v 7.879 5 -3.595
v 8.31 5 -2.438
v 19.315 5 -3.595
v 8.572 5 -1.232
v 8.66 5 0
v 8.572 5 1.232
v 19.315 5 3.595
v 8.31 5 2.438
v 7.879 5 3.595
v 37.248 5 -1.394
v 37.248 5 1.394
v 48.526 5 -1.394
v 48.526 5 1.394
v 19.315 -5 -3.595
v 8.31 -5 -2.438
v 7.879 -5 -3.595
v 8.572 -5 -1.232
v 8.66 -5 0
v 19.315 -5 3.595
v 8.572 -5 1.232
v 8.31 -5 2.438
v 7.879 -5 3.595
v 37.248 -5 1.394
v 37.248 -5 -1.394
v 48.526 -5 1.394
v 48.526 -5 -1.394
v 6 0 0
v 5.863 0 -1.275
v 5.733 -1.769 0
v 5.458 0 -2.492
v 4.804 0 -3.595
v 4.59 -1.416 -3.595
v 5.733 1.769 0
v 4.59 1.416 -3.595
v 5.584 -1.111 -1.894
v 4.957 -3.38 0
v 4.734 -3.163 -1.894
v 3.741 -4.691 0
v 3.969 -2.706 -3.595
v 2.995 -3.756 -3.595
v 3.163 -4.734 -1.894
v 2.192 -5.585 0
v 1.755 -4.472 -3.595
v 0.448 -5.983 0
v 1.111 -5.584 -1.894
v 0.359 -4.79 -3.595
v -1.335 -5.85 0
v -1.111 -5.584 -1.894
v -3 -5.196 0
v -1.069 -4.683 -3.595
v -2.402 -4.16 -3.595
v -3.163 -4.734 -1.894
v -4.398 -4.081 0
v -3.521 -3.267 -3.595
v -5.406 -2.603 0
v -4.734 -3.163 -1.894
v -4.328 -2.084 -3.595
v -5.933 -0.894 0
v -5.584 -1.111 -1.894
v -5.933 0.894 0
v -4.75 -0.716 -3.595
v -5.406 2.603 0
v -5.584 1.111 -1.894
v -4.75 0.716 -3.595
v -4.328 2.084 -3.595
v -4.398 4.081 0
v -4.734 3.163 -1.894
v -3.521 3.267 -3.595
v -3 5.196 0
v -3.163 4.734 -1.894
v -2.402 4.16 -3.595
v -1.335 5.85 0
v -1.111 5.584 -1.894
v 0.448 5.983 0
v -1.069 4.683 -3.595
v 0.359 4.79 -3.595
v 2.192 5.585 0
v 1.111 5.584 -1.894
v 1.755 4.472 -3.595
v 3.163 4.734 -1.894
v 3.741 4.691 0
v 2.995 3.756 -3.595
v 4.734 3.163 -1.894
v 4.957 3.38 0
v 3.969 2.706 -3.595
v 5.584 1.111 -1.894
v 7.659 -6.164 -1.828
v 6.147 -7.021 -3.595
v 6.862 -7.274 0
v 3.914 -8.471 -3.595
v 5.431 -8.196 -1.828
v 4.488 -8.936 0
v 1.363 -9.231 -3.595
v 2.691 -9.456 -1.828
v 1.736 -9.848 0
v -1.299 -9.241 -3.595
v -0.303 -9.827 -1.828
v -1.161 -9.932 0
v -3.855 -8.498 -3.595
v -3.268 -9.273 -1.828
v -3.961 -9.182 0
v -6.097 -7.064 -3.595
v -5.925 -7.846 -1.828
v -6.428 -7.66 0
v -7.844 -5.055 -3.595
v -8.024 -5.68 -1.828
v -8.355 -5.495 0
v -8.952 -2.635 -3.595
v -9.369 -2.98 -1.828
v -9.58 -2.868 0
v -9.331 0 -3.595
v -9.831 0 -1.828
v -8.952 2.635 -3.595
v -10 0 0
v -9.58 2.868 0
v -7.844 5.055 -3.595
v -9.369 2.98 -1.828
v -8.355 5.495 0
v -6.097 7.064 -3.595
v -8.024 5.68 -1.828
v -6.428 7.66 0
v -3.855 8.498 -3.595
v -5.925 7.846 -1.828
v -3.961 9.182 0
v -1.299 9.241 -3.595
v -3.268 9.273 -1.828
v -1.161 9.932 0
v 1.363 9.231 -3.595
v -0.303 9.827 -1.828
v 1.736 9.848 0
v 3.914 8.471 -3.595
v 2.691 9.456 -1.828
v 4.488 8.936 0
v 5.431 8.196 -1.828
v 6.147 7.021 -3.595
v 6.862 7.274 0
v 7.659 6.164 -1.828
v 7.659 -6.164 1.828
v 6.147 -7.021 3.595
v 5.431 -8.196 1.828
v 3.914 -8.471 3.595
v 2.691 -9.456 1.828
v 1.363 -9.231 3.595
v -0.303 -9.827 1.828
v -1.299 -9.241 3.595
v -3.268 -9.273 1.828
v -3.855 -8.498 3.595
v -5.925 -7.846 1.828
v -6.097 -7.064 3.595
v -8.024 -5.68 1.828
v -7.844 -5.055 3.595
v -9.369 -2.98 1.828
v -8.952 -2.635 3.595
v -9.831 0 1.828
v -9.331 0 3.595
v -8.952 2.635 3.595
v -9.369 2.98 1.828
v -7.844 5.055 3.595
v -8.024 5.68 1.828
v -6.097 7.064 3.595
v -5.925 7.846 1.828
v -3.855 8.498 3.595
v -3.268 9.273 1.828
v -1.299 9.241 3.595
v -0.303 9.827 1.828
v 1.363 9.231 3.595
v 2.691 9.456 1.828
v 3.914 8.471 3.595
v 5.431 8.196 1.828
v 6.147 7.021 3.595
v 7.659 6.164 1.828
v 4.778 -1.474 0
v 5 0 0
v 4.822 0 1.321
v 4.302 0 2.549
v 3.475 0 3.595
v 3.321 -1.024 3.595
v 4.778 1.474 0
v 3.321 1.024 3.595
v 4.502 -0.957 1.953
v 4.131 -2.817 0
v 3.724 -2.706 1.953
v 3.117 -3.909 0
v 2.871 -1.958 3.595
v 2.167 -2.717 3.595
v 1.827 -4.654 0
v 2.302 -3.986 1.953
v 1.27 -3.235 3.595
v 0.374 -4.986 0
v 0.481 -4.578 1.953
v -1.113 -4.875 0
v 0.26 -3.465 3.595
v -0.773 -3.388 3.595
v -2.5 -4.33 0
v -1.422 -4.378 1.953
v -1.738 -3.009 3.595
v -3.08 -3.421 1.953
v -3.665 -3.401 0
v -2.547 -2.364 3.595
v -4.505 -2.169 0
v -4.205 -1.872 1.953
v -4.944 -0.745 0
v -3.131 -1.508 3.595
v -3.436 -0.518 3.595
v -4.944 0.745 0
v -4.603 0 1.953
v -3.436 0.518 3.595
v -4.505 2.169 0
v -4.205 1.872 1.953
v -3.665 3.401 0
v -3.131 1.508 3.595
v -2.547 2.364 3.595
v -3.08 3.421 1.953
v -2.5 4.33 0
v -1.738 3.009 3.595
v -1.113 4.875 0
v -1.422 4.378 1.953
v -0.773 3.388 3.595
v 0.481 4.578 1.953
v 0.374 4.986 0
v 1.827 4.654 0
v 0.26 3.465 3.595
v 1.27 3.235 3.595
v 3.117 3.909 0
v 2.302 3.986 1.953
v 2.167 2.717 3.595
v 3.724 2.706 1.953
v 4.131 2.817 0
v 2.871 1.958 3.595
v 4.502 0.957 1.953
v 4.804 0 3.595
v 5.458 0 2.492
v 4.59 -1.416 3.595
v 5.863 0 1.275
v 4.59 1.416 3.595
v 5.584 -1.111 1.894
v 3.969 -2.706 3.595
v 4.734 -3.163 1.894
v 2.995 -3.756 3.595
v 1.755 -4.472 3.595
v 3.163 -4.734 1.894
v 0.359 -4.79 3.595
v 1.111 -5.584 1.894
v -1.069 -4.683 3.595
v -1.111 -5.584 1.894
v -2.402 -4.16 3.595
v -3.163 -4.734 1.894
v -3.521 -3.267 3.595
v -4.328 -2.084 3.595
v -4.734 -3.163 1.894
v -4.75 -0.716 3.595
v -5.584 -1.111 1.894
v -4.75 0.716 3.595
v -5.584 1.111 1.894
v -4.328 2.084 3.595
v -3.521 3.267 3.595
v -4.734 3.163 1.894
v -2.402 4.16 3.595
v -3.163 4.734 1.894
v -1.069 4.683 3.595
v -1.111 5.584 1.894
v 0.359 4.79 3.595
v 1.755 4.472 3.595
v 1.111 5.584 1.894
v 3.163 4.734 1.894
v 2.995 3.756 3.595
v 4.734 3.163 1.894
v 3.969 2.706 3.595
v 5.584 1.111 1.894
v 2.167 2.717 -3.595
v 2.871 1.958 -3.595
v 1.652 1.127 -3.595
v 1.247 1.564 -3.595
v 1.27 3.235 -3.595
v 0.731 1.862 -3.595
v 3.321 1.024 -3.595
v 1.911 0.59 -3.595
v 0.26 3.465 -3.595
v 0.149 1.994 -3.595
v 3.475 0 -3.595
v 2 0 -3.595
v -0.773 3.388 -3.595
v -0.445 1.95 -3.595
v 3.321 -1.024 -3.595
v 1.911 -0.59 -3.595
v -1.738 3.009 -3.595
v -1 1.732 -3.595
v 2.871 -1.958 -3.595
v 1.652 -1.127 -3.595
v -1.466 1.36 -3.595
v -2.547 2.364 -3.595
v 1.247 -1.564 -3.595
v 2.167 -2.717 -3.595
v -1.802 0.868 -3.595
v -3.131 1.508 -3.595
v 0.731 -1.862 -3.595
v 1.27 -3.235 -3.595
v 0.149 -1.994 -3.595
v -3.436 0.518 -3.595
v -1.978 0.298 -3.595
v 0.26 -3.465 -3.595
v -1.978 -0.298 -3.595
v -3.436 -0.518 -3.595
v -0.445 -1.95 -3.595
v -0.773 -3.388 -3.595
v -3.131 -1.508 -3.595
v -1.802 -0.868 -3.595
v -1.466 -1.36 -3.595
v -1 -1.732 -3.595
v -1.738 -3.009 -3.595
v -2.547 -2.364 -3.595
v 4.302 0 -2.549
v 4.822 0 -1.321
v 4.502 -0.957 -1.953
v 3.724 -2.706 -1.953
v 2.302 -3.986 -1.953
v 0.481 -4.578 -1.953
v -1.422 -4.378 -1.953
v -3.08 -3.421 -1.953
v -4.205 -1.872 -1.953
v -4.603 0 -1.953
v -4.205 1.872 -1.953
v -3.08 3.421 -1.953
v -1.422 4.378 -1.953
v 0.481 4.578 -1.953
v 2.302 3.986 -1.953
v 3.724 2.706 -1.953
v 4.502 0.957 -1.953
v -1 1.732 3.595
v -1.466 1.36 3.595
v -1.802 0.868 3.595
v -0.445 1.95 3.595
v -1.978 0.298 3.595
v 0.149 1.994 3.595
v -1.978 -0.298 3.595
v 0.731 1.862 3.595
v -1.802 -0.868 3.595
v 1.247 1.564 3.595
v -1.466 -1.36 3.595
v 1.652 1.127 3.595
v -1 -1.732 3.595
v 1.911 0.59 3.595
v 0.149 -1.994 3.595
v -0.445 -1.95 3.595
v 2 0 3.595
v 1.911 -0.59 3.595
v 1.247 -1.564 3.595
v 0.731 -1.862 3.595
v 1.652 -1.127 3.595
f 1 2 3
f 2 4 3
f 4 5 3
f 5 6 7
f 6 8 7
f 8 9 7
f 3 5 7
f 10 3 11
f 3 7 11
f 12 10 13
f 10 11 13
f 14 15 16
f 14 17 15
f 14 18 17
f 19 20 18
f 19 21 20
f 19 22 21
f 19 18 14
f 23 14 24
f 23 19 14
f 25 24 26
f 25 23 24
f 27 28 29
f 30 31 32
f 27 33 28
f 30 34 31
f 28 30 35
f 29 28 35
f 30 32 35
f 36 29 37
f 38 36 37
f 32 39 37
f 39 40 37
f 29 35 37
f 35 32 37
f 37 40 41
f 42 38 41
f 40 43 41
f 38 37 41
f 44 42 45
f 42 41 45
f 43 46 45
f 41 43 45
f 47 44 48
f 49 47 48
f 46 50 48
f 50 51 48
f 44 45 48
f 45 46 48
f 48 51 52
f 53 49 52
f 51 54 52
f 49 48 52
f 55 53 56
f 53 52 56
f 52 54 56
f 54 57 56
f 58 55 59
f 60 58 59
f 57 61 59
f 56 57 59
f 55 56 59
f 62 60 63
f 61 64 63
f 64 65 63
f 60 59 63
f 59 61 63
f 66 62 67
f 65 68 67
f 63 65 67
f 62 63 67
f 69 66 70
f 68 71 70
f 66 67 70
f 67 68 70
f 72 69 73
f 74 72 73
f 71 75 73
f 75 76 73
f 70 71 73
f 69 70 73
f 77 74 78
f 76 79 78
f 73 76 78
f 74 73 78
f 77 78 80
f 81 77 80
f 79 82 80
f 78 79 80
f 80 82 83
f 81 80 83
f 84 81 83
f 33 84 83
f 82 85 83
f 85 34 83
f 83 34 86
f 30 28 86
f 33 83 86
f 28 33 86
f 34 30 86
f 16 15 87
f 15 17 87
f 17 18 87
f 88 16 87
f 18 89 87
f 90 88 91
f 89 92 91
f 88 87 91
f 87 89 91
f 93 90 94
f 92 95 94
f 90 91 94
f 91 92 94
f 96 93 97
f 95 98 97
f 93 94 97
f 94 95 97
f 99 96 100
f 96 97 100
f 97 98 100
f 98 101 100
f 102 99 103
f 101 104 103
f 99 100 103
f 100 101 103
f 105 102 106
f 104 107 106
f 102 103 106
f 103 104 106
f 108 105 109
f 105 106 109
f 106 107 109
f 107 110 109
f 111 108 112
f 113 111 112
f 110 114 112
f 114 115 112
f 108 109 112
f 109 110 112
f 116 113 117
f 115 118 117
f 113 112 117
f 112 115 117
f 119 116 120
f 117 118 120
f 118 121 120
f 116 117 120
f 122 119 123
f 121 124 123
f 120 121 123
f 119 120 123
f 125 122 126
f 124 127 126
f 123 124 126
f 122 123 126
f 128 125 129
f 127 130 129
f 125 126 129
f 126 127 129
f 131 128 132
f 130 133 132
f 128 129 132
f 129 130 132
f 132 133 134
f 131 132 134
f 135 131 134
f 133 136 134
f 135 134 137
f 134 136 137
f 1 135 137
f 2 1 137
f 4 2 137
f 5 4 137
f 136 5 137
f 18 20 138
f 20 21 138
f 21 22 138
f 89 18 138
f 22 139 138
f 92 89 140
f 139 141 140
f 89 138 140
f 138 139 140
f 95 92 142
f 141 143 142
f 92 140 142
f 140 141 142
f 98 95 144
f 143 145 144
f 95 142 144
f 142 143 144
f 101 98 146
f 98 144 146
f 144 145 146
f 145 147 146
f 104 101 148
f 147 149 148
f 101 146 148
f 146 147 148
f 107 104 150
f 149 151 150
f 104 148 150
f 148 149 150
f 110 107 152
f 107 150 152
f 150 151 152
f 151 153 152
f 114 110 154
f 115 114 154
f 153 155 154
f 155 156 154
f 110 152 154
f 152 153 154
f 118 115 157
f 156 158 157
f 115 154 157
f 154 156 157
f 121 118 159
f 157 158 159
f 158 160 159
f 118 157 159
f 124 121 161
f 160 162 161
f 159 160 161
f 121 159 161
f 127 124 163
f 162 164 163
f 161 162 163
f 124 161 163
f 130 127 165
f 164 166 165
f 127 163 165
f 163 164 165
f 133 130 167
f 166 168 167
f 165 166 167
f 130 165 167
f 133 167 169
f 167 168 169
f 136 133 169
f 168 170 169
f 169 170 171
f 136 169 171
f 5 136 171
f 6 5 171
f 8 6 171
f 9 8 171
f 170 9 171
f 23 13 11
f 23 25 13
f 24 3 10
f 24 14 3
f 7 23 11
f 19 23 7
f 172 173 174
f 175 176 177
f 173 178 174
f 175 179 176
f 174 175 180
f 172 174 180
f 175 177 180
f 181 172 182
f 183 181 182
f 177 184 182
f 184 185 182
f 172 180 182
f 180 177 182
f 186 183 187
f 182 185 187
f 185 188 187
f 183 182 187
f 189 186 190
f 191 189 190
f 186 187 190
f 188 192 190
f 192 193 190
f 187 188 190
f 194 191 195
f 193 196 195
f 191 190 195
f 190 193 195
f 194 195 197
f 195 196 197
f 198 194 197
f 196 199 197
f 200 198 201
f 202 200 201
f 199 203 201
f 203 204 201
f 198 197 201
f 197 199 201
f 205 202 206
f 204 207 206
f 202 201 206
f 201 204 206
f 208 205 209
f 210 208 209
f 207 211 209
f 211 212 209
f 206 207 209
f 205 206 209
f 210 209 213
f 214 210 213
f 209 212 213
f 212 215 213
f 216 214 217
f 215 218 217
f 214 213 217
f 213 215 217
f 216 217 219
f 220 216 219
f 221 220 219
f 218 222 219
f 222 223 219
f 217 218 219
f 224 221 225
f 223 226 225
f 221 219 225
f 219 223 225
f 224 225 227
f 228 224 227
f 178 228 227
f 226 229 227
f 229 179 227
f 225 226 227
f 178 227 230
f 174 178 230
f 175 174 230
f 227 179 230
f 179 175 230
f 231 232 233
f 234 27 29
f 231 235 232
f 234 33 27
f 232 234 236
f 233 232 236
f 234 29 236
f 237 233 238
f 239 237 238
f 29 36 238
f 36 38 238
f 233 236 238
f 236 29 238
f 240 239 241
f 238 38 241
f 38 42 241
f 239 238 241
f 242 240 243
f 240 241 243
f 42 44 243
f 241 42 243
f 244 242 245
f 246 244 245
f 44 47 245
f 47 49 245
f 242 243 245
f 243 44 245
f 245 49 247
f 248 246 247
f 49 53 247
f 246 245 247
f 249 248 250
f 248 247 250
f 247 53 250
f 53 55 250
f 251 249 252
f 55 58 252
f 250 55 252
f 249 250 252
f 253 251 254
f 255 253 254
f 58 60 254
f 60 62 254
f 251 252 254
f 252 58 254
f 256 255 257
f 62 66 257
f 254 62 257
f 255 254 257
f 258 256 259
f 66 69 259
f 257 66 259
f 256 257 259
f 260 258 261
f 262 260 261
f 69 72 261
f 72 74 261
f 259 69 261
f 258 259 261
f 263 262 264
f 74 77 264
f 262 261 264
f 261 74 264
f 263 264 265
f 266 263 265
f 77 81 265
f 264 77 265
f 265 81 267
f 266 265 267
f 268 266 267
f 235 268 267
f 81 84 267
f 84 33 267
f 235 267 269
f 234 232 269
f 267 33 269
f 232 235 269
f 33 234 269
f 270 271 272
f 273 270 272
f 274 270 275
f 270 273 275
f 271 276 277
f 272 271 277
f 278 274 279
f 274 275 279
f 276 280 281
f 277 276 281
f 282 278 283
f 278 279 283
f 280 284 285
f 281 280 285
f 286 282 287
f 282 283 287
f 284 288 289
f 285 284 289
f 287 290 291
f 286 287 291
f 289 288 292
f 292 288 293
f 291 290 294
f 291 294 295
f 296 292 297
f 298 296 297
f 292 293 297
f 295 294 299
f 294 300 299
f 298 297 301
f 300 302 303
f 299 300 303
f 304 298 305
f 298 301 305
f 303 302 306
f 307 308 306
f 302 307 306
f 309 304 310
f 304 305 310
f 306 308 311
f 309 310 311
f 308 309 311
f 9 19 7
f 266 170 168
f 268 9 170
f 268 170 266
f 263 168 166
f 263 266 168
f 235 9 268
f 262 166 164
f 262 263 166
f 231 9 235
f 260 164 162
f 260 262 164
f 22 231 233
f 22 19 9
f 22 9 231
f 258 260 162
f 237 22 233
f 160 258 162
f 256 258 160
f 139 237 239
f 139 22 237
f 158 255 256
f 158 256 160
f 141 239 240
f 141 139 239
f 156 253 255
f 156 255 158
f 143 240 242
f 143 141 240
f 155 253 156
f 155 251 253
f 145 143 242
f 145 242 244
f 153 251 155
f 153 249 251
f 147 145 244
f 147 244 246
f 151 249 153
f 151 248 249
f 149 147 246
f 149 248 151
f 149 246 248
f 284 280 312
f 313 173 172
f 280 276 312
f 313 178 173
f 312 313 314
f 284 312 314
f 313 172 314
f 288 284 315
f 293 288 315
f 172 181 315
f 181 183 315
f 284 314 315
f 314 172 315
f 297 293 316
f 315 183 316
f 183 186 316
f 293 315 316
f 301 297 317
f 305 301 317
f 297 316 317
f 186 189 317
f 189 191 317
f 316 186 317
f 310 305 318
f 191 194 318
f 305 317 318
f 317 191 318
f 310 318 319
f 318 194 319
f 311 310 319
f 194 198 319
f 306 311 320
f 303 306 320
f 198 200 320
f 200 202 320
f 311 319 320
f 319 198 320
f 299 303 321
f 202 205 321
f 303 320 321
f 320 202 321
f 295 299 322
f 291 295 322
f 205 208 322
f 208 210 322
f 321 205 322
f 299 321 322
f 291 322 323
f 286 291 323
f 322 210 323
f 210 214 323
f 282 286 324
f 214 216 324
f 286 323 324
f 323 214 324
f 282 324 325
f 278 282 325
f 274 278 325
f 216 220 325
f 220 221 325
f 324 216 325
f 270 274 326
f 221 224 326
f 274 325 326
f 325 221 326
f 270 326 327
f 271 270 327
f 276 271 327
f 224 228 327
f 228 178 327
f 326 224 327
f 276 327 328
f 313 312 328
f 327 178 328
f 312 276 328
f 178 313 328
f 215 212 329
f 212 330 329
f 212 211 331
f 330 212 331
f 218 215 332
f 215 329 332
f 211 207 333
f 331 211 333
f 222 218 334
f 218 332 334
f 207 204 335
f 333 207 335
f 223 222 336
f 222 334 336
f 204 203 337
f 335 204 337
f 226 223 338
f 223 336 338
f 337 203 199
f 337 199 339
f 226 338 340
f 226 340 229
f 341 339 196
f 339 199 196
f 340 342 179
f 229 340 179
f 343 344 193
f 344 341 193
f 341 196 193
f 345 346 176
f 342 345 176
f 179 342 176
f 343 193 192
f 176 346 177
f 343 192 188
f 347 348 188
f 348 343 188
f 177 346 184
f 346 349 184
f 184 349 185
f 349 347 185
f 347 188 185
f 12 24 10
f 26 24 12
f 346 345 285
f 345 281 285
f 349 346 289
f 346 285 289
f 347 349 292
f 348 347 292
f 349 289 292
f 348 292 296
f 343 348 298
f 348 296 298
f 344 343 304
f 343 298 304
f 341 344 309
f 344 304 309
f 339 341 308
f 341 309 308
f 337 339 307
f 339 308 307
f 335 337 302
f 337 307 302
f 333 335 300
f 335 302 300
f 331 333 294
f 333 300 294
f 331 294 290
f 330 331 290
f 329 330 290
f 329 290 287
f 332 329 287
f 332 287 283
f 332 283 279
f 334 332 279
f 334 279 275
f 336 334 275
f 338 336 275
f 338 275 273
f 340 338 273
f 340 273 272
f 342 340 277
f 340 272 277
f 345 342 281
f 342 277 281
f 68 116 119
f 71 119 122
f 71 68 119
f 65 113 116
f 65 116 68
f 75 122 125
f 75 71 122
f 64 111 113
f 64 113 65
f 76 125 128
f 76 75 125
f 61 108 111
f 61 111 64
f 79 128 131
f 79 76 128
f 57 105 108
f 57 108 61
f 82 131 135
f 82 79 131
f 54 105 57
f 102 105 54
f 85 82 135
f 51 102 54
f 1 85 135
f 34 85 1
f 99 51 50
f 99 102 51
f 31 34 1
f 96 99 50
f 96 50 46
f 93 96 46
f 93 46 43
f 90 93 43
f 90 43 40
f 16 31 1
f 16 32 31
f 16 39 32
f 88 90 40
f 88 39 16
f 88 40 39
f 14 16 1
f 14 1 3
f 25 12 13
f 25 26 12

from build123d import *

# Parameters (mm, degrees)
F2_DEPTH      = 5
F2_DEPTH_BACK = 5


with BuildPart() as f1:
    # F0 (on Front) → F1 (revolve)
    with BuildSketch(Plane.XZ):
        with BuildLine():
            ThreePointArc((3.4750503593, -3.595), (4.6030018356, -1.9525301794), (5, 0))
            Line((5, 0), (2, 0))
            Line((2, 0), (2, -3.595))
            Line((2, -3.595), (3.4750503593, -3.595))
        make_face()
        with BuildLine():
            Line((2, 0), (5, 0))
            ThreePointArc((5, 0), (4.6030018356, 1.9525301794), (3.4750503593, 3.595))
            Line((3.4750503593, 3.595), (2, 3.595))
            Line((2, 3.595), (2, 0))
        make_face()
    revolve(axis=Axis((0, 0, -0.8289581165), (0, 0, -1)))


with BuildPart() as f1b:
    # F0 (on Front) → F1, piece 2 (revolve)
    with BuildSketch(Plane.XZ):
        with BuildLine():
            Line((7.067598393, -3.595), (7.067598393, 0))
            Line((7.067598393, 0), (6, 0))
            ThreePointArc((6, 0), (5.693086843, -1.8944028604), (4.8037459342, -3.595))
            Line((4.8037459342, -3.595), (7.067598393, -3.595))
        make_face()
        with BuildLine():
            Line((7.067598393, 0), (7.067598393, 3.595))
            Line((7.067598393, 3.595), (4.8037459342, 3.595))
            ThreePointArc((4.8037459342, 3.595), (5.693086843, 1.8944028604), (6, 0))
            Line((6, 0), (7.067598393, 0))
        make_face()
        with BuildLine():
            ThreePointArc((10, 0), (9.8314421251, 1.8283177352), (9.3314508518, 3.595))
            Line((9.3314508518, 3.595), (7.067598393, 3.595))
            Line((7.067598393, 3.595), (7.067598393, 0))
            Line((7.067598393, 0), (10, 0))
        make_face()
        with BuildLine():
            ThreePointArc((9.3314508518, -3.595), (9.8314421251, -1.8283177352), (10, 0))
            Line((10, 0), (7.067598393, 0))
            Line((7.067598393, 0), (7.067598393, -3.595))
            Line((7.067598393, -3.595), (9.3314508518, -3.595))
        make_face()
    revolve(axis=Axis((0, 0, -0.8289581165), (0, 0, -1)))

    # F0 (on Front) → F2 (join, two sides)
    with BuildSketch(Plane.XZ) as f2_sk:
        with BuildLine():
            Line((19.3147519061, 3.595), (9.3314508518, 3.595))
            ThreePointArc((9.3314508518, 3.595), (9.8314421251, 1.8283177352), (10, 0))
            ThreePointArc((10, 0), (9.8314421251, -1.8283177352), (9.3314508518, -3.595))
            Line((9.3314508518, -3.595), (19.3147519061, -3.595))
            Line((19.3147519061, -3.595), (37.2479334474, -1.3942536898))
            Line((37.2479334474, -1.3942536898), (48.5257059336, -1.3942536898))
            Line((48.5257059336, -1.3942536898), (48.5257059336, 1.3942536898))
            Line((48.5257059336, 1.3942536898), (37.2479334474, 1.3942536898))
            Line((37.2479334474, 1.3942536898), (19.3147519061, 3.595))
        make_face()
        with BuildLine():
            ThreePointArc((10, 0), (9.8314421251, 1.8283177352), (9.3314508518, 3.595))
            Line((9.3314508518, 3.595), (7.067598393, 3.595))
            Line((7.067598393, 3.595), (7.067598393, 0))
            Line((7.067598393, 0), (10, 0))
        make_face()
        with BuildLine():
            ThreePointArc((9.3314508518, -3.595), (9.8314421251, -1.8283177352), (10, 0))
            Line((10, 0), (7.067598393, 0))
            Line((7.067598393, 0), (7.067598393, -3.595))
            Line((7.067598393, -3.595), (9.3314508518, -3.595))
        make_face()
    extrude(amount=F2_DEPTH)
    extrude(f2_sk.sketch, amount=-F2_DEPTH_BACK)


solid = Compound([f1.part, f1b.part])
